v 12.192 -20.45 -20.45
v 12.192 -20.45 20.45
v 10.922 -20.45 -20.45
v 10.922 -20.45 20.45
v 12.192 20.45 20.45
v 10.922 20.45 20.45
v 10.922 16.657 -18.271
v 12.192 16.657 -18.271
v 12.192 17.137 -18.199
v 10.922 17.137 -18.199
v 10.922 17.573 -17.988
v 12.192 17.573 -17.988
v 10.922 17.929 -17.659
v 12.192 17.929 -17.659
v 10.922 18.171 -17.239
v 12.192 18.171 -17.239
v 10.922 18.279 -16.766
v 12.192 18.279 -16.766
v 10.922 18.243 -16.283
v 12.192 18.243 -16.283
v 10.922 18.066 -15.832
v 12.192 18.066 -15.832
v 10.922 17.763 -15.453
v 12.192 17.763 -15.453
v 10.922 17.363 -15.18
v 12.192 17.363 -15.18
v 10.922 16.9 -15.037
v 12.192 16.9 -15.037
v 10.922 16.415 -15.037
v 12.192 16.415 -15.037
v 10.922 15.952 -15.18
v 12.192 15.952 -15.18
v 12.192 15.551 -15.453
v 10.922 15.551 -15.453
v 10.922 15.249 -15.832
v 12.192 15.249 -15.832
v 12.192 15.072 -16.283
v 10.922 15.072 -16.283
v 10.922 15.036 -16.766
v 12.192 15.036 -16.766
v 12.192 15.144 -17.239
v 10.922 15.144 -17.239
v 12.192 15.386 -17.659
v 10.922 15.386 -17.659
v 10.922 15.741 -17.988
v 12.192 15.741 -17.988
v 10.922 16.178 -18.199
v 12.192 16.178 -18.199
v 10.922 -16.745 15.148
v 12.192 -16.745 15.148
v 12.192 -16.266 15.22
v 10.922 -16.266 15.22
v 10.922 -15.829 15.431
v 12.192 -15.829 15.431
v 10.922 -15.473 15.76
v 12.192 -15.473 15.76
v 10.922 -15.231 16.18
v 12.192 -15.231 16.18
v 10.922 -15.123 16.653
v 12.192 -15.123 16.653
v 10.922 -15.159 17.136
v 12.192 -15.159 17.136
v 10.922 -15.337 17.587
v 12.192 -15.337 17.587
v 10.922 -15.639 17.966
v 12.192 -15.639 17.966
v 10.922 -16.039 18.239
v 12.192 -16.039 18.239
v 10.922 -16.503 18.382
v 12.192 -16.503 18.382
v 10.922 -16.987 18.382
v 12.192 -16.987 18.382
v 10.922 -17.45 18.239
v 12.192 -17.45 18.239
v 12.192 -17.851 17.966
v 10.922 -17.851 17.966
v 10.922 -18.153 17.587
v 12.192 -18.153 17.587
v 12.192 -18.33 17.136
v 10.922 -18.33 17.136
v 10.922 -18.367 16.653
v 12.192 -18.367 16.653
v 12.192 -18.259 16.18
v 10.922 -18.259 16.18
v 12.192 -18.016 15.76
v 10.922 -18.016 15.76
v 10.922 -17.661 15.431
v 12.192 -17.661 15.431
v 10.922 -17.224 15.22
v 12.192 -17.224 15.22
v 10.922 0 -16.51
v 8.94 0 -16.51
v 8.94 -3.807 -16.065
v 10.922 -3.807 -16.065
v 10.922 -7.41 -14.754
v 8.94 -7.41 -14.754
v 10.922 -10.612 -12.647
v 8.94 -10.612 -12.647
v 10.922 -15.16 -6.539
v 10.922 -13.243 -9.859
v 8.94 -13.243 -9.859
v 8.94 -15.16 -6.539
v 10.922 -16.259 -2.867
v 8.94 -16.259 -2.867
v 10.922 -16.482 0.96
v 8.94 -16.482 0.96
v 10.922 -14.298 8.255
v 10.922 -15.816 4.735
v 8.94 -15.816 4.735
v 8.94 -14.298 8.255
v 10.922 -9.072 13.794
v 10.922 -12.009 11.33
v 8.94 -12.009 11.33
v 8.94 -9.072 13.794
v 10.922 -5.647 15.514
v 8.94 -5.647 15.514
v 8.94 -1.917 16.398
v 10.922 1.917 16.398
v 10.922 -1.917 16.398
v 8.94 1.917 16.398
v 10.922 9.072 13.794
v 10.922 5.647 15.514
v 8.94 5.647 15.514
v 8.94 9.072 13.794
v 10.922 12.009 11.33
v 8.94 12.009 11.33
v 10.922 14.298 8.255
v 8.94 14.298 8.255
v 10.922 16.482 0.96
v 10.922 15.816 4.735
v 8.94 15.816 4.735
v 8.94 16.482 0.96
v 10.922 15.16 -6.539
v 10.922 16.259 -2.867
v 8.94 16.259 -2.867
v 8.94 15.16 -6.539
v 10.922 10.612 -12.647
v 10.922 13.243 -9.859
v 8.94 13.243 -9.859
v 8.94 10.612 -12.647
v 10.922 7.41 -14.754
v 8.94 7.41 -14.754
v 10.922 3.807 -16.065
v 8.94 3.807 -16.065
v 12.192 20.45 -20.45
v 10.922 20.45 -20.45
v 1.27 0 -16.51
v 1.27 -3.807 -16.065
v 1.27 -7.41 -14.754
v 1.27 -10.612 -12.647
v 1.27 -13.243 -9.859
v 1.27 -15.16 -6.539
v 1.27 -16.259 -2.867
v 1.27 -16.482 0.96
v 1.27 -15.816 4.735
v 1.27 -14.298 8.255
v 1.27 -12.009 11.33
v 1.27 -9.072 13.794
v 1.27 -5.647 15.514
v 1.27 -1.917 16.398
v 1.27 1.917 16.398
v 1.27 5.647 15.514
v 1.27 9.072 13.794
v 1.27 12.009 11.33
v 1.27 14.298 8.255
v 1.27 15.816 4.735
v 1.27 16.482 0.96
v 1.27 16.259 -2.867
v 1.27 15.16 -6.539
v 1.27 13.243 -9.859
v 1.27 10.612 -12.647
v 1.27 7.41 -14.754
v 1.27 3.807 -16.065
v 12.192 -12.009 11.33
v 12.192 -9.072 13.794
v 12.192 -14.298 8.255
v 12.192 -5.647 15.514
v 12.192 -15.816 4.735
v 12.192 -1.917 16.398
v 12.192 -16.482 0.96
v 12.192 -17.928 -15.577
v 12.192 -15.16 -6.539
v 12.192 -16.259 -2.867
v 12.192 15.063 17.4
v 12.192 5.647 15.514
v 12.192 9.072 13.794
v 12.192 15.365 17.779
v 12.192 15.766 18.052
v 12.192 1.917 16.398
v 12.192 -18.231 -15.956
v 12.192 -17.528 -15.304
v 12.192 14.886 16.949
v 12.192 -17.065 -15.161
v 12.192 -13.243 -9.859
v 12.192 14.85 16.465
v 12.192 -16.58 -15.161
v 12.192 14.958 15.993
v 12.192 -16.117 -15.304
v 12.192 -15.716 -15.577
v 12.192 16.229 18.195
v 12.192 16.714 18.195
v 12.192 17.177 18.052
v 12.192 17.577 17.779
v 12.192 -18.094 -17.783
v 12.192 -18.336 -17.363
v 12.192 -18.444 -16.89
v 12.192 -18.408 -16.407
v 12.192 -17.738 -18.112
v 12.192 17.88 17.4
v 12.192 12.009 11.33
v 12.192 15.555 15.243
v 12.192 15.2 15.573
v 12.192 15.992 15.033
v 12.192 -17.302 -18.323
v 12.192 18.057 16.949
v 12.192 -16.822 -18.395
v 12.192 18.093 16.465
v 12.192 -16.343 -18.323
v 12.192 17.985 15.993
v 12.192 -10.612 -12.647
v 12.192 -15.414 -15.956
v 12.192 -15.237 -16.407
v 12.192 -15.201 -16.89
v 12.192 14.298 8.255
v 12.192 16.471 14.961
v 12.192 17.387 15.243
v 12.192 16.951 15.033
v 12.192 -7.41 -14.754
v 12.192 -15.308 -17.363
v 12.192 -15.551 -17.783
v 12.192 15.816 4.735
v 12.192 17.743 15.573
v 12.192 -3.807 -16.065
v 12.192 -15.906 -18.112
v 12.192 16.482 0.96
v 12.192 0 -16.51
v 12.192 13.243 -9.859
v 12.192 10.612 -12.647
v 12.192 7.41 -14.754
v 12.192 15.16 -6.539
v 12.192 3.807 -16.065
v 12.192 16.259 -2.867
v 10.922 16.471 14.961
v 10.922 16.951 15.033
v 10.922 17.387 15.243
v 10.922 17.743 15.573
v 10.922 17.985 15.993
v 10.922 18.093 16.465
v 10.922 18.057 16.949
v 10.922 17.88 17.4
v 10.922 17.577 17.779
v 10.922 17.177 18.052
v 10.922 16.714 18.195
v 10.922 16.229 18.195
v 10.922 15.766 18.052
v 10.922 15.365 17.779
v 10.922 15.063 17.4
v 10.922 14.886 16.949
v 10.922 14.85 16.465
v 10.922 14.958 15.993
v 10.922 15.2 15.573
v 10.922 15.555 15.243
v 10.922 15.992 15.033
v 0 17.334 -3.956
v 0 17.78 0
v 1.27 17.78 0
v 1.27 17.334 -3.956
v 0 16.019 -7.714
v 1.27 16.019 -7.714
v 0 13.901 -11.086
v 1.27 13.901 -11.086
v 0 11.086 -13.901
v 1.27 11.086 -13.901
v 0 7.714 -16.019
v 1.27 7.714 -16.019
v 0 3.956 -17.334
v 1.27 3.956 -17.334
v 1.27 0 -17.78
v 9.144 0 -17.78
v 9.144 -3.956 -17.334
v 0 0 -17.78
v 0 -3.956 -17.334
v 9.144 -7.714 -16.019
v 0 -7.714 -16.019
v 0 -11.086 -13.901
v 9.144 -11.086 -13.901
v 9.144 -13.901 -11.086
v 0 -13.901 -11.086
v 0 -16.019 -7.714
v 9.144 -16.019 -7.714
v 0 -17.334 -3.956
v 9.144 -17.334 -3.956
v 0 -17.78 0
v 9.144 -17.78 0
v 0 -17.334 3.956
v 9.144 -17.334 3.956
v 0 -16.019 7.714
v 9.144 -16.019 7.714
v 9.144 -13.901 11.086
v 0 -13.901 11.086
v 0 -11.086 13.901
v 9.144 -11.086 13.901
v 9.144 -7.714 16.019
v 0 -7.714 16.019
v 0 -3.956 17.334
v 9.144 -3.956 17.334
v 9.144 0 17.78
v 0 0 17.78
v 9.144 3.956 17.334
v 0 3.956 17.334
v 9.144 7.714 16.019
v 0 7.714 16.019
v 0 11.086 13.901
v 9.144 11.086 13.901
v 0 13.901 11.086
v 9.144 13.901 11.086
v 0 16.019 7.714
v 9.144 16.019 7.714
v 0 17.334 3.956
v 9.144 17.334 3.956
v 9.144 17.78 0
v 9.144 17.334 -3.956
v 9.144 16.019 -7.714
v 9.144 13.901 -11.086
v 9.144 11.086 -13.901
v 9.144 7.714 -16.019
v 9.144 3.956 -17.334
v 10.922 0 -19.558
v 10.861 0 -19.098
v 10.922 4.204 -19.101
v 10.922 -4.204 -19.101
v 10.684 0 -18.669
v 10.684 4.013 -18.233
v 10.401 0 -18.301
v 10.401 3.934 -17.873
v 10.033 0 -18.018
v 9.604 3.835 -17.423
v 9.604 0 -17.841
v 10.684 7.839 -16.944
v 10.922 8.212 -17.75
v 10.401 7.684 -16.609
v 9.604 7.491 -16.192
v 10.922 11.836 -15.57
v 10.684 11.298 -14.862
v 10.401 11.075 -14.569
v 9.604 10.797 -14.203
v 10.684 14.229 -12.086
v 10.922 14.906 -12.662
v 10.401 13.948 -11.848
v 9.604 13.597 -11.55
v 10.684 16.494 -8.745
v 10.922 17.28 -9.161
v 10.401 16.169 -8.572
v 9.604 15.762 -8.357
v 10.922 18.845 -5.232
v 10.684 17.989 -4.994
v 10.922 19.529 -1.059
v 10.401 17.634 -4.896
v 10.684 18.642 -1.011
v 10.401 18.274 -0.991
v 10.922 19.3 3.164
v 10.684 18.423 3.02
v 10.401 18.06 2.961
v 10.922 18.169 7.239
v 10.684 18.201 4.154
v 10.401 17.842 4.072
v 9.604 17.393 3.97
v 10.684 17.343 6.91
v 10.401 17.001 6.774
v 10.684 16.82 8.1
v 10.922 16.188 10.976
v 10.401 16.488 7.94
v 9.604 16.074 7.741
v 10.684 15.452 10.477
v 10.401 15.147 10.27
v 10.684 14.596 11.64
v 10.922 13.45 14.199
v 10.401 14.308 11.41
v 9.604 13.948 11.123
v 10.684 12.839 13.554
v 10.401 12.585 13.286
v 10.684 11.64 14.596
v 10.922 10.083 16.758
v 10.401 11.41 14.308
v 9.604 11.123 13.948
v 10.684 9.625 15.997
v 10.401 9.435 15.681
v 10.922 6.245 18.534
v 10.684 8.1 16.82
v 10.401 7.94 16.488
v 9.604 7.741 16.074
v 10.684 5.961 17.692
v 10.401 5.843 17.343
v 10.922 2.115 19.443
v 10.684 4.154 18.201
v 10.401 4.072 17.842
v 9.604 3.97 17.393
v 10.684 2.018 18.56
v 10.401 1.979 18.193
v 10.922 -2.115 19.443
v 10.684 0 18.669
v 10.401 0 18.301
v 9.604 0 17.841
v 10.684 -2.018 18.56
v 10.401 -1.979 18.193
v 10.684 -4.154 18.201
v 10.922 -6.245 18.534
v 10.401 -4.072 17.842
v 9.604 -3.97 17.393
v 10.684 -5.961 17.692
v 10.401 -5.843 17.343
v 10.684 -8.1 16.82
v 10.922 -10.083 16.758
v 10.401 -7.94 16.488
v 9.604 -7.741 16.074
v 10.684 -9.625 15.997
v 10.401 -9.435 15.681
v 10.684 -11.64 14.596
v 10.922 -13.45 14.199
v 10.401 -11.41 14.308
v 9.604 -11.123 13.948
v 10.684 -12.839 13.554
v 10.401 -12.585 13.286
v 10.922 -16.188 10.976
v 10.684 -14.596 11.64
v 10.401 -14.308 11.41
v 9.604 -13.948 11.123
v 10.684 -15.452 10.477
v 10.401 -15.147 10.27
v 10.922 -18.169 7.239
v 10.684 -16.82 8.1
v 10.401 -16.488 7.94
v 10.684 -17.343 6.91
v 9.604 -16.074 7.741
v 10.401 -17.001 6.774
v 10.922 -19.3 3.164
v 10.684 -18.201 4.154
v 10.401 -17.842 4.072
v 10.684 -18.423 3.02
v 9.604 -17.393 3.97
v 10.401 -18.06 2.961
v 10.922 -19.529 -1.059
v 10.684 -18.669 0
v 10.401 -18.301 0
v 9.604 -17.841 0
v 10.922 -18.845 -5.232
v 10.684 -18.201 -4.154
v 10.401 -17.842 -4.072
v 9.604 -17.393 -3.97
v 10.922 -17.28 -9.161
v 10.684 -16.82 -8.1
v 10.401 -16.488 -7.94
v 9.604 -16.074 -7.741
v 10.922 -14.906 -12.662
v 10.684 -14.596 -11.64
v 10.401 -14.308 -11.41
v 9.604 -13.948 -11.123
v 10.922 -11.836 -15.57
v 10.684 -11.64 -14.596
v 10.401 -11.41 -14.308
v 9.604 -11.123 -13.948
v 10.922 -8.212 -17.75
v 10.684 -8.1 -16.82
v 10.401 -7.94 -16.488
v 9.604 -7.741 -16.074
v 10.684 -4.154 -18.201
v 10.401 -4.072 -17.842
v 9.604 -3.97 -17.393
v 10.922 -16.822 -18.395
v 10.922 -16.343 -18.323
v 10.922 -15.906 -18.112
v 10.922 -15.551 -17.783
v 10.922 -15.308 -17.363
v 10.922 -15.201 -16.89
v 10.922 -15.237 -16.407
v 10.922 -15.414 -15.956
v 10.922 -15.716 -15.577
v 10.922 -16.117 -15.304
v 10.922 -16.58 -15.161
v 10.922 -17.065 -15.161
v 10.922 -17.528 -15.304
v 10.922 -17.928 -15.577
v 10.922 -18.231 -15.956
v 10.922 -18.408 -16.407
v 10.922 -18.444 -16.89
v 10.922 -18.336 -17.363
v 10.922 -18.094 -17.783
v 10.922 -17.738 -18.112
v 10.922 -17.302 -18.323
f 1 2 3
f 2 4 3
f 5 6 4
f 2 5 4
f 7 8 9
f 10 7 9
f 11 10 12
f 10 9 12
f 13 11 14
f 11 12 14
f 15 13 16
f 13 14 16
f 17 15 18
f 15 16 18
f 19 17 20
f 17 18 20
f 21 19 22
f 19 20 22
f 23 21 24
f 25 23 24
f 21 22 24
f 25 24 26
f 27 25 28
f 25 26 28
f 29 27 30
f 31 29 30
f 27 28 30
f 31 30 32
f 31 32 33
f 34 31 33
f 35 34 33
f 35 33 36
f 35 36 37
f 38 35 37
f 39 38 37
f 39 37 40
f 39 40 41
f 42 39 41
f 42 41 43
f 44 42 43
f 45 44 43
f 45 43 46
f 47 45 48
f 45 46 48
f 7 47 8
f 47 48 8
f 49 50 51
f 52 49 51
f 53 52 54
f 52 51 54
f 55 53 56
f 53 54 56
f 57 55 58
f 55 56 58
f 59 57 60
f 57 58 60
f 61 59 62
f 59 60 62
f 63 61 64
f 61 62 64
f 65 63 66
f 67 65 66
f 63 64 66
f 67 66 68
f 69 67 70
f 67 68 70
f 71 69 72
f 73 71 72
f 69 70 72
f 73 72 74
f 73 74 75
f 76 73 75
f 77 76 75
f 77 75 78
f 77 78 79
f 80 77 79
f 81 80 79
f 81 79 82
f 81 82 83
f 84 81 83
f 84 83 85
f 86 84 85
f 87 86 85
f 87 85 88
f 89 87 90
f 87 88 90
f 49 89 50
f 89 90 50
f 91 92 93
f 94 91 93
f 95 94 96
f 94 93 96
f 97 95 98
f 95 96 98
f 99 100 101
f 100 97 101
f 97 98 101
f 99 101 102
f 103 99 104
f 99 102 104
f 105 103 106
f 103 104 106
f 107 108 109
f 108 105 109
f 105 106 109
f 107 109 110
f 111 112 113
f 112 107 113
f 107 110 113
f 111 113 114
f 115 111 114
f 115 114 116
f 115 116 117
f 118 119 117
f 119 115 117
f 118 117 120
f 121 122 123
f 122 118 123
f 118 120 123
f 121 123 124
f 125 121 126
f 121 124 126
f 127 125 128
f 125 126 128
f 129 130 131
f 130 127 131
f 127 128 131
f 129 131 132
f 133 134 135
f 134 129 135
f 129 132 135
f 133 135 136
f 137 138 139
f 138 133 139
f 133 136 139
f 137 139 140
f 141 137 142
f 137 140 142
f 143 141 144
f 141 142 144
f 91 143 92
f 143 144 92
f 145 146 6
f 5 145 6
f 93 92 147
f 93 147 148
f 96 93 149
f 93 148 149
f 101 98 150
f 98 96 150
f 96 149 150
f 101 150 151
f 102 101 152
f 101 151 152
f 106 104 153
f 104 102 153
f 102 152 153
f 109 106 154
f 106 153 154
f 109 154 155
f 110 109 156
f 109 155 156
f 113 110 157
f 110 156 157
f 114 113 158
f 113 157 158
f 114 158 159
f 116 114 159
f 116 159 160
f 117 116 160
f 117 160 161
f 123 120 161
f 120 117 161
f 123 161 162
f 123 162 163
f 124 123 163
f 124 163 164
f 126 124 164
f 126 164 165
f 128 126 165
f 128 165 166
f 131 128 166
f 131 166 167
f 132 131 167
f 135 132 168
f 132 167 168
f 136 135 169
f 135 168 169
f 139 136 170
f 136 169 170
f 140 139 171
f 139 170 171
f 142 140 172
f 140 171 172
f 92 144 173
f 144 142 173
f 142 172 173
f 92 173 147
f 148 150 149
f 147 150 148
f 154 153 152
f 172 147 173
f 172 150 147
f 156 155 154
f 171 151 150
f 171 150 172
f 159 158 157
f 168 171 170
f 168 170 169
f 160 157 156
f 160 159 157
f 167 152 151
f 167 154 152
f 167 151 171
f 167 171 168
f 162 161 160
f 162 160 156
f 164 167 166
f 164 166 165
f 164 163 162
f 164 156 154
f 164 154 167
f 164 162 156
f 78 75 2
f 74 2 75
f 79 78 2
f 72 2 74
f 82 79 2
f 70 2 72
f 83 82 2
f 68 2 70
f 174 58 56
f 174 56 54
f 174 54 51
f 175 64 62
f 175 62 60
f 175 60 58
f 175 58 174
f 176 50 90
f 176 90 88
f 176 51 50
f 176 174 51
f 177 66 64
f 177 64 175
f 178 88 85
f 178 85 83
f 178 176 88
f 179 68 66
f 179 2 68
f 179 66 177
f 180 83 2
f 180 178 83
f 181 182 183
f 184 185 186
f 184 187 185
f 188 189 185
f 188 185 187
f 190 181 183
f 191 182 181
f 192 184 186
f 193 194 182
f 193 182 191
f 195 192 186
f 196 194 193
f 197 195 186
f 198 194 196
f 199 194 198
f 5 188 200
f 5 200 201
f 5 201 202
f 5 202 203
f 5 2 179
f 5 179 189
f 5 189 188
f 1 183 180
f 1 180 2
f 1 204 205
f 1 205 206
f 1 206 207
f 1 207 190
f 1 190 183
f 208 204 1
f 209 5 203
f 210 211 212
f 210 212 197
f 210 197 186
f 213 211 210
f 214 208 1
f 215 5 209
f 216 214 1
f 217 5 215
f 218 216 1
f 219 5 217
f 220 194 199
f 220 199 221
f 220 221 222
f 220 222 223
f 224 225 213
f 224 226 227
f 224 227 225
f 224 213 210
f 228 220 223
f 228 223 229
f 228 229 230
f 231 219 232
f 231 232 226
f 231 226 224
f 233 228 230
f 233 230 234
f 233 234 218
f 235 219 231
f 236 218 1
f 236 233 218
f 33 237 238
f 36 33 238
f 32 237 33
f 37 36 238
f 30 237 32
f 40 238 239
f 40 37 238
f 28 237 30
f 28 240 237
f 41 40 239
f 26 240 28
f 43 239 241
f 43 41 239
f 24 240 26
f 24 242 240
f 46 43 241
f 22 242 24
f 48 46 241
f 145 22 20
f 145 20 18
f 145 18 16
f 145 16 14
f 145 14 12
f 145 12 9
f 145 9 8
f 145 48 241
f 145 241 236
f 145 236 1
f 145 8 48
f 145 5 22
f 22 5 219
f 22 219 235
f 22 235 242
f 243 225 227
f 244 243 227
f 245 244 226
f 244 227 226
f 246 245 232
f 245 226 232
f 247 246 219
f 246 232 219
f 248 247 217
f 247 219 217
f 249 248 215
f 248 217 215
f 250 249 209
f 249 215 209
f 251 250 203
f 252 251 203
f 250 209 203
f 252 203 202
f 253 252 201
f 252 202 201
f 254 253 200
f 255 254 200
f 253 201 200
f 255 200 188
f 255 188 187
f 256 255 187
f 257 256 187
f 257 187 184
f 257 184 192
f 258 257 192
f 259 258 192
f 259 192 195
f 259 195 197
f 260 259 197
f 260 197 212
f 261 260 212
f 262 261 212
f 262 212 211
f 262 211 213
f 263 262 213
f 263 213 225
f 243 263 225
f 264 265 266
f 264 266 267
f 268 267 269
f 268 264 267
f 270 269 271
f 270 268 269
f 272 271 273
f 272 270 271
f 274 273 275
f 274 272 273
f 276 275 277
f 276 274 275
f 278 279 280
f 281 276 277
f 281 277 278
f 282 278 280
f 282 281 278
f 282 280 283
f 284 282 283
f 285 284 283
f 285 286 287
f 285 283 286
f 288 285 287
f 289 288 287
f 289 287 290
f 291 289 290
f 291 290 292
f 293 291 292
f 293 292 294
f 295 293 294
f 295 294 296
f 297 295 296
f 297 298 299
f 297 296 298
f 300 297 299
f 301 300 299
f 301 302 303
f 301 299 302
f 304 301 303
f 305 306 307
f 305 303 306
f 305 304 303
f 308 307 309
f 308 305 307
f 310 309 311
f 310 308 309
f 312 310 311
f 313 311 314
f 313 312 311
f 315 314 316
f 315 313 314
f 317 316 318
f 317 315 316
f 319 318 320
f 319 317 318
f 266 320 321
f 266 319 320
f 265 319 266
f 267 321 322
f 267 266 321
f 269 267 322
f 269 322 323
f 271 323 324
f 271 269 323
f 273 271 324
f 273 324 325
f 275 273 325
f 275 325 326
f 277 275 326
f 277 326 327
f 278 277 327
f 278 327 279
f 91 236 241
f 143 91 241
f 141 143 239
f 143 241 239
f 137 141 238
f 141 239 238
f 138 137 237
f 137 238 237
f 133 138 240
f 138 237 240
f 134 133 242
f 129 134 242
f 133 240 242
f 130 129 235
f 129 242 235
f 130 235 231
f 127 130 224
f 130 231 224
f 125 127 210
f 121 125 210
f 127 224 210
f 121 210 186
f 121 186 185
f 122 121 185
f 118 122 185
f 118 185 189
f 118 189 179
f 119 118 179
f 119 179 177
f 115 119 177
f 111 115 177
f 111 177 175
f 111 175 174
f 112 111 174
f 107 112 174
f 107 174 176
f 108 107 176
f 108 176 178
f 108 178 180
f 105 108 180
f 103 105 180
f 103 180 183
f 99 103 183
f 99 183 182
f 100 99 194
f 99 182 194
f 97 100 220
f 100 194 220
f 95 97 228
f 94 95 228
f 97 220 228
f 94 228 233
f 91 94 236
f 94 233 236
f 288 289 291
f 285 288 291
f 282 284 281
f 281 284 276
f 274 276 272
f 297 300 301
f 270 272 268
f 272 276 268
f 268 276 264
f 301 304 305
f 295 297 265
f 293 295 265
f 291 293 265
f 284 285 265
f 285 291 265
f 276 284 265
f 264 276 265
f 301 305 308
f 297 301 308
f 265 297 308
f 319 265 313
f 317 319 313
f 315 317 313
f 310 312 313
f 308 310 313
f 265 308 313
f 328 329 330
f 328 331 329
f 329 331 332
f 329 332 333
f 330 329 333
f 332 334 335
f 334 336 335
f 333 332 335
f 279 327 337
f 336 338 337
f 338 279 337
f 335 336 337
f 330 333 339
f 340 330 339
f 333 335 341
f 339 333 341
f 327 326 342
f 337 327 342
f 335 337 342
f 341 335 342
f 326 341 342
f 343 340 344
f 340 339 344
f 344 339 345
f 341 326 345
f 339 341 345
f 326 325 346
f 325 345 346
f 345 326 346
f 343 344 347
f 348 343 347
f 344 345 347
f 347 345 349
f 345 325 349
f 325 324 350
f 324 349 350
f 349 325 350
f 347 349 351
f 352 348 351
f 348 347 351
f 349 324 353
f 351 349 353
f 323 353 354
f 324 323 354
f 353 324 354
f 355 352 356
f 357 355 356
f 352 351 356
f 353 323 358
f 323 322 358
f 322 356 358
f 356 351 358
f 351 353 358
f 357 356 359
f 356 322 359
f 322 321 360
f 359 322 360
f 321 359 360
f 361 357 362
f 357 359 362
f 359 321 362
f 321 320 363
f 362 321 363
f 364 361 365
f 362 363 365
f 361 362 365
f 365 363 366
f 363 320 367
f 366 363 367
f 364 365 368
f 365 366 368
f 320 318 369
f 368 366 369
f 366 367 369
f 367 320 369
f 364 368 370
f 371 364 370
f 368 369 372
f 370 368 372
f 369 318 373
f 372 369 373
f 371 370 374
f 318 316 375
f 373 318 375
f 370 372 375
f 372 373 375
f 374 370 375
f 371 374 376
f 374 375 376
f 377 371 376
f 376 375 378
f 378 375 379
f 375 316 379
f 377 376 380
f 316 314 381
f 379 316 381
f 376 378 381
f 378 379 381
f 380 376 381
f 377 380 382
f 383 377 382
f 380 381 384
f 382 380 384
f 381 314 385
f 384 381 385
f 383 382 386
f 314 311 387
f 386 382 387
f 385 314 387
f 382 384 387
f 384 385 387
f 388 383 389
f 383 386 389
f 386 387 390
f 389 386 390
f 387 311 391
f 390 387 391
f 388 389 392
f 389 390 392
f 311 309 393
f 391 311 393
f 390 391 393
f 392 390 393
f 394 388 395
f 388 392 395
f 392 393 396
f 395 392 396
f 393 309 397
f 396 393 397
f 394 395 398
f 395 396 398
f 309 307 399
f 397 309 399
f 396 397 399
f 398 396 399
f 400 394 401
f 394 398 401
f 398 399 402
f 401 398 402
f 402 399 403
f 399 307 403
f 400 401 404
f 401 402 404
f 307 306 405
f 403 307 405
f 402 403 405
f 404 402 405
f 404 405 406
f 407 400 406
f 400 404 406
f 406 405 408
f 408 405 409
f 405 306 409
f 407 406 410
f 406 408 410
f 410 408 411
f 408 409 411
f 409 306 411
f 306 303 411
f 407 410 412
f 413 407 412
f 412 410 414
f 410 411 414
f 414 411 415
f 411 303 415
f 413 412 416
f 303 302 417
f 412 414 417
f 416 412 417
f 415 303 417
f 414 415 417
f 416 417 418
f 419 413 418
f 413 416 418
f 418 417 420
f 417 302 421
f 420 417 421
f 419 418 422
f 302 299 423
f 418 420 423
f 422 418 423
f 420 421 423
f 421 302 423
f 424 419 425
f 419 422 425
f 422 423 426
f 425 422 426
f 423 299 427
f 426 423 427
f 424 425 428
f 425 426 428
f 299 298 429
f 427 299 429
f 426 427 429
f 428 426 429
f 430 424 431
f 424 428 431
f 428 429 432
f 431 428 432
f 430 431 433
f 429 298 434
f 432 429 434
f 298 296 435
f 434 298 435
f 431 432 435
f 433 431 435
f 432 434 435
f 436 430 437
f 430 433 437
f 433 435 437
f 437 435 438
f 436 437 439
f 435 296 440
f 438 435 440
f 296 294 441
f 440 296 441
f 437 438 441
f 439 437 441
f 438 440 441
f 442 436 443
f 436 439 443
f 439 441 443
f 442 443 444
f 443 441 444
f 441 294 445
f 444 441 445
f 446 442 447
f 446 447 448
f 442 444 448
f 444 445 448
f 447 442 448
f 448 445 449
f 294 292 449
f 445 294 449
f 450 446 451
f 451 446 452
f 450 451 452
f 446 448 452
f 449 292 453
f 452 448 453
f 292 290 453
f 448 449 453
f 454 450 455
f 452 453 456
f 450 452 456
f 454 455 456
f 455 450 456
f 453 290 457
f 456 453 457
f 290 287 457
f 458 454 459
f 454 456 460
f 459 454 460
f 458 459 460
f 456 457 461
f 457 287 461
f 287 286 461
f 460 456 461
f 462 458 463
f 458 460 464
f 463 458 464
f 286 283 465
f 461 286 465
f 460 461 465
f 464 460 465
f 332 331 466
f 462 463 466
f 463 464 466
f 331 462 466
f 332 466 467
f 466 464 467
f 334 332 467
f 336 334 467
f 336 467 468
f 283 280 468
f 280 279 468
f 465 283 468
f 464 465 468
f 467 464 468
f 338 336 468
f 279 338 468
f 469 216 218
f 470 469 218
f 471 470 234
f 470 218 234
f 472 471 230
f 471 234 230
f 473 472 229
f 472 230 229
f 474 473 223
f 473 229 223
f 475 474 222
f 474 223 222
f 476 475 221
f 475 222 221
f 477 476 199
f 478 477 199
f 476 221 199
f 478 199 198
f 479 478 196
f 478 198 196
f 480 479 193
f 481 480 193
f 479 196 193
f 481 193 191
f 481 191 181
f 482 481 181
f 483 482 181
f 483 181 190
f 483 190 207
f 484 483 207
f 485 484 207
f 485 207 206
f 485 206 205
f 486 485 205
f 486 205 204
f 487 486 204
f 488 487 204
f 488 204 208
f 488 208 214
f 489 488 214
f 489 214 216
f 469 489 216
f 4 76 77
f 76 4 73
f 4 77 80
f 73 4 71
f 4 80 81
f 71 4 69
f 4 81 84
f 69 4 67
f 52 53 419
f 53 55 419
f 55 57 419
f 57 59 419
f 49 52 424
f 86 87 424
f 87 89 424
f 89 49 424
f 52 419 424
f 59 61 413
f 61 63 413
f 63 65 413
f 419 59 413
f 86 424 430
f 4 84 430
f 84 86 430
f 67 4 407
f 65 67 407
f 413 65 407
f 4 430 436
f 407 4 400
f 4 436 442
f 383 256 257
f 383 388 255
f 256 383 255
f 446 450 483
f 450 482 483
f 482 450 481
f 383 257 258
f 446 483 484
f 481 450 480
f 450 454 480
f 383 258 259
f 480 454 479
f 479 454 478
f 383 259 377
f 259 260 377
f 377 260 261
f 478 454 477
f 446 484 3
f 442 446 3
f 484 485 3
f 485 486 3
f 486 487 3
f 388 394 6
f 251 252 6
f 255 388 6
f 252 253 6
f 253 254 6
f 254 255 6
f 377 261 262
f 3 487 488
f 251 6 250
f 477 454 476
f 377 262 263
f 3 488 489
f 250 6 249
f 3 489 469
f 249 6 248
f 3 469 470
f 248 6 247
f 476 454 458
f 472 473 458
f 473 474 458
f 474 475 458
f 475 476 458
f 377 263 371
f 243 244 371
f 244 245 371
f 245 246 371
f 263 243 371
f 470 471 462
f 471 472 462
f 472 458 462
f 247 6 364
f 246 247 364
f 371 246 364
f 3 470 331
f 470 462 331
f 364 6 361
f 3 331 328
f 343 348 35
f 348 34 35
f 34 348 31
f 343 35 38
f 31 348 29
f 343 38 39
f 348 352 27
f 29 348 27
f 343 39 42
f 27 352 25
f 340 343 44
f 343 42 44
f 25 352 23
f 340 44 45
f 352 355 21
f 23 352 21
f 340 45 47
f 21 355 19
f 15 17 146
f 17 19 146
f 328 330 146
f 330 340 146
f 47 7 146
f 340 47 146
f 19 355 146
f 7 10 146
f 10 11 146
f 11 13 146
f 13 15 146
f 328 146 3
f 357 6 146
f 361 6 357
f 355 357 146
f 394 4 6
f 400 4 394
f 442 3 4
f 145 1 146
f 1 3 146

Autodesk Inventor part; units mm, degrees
ref_plane "YZ Plane" through (0, 0, 0) normal (1, 0, 0) x (0, 1, 0)
ref_plane "XZ Plane" through (0, 0, 0) normal (0, 1, 0) x (-1, 0, 0)
ref_plane "XY Plane" through (0, 0, 0) normal (0, 0, 1) x (1, 0, 0)
sketch "Sketch1" plane through (0, 0, 0) normal (1, 0, 0) x (0, 1, 0)
  circle A0 centre (0, 0) radius 17.78
  dimension "d0" = 35.56
extrude "Extrusion1" add sketch "Sketch1" along normal blind 1.27
sketch "Sketch2" plane through (1.27, 0, 0) normal (1, 0, 0) x (0, 0, -1)
  circle A0 centre (0, 0) radius 17.78
  circle A1 centre (0, 0) radius 16.51
  dimension "d3" = 35.56
  dimension "d4" = 33.02
extrude "Extrusion2" add sketch "Sketch2" along normal blind 9.652
sketch "Sketch3" plane through (10.922, 0, 0) normal (1, 0, 0) x (0, 0, -1)
  line L0 (-20.45, -20.45) -> (20.45, -20.45)
  line L1 (20.45, -20.45) -> (20.45, 20.45)
  line L2 (20.45, 20.45) -> (-20.45, 20.45)
  line L3 (-20.45, 20.45) -> (-20.45, -20.45)
  line L4 (-20.45, -20.45) -> (20.45, 20.45) construction
  line L5 (20.45, -20.45) -> (-20.45, 20.45) construction
  point P0 (0, 0)
  dimension "d7" = 40.9
  dimension "d8" = 40.9
extrude "Extrusion3" add sketch "Sketch3" along normal blind 1.27
sketch "Sketch4" plane through (12.192, 0, 0) normal (1, 0, 0) x (0, 0, -1)
  circle A0 centre (0, 0) radius 16.51
  line L0 (-20.45, 20.45) -> (-20.45, -20.45) projected
  line L1 (20.45, -20.45) -> (20.45, 20.45) projected
  line L2 (-20.45, -20.45) -> (20.45, -20.45) projected
  line L3 (20.45, 20.45) -> (-20.45, 20.45) projected
  line L4 (-16.7742, -16.7449) -> (16.7742, -16.745)
  line L5 (16.7742, -16.745) -> (16.7742, 16.745)
  line L6 (16.7742, 16.745) -> (-16.7742, 16.7449)
  line L7 (-16.7742, 16.7449) -> (-16.7742, -16.7449)
  line L8 (-16.7742, -16.7449) -> (16.7742, 16.745) construction
  line L9 (16.7742, -16.745) -> (-16.7742, 16.7449) construction
  circle A1 centre (-16.7742, -16.7449) radius 1.6262
  circle A2 centre (16.7687, -16.8222) radius 1.6262
  circle A3 centre (16.6447, 16.6573) radius 1.6262
  circle A4 centre (-16.5868, 16.4713) radius 1.6262
  dimension "d18" = 33.02
  dimension "d25" = 40.9
  dimension "d32" = 33.4899
  dimension "d33" = 33.5483
  dimension "d34" = 3.2524
  dimension "d35" = 3.2524
  dimension "d36" = 3.2524
  dimension "d37" = 3.2524
extrude "Extrusion4" cut sketch "Sketch4" against normal blind 3.2524 contours A0 | L7 A1 L4 | L4 A1 L7 | A2 L5 L4 | L4 L5 A2 | A4 L6 L7 | L7 L6 A4 | A3 L6 L5 | L5 L6 A3
fillet "Fillet1" radius 1.778 1 edges at (10.922, 0, 17.78)
sketch "Sketch5" plane through (0, 0, 0) normal (-1, 0, 0) x (0, 0, 1)
  point P0 (0, 0)
equation "\"d16\" = d35"
properties part number "MagnetCap"
